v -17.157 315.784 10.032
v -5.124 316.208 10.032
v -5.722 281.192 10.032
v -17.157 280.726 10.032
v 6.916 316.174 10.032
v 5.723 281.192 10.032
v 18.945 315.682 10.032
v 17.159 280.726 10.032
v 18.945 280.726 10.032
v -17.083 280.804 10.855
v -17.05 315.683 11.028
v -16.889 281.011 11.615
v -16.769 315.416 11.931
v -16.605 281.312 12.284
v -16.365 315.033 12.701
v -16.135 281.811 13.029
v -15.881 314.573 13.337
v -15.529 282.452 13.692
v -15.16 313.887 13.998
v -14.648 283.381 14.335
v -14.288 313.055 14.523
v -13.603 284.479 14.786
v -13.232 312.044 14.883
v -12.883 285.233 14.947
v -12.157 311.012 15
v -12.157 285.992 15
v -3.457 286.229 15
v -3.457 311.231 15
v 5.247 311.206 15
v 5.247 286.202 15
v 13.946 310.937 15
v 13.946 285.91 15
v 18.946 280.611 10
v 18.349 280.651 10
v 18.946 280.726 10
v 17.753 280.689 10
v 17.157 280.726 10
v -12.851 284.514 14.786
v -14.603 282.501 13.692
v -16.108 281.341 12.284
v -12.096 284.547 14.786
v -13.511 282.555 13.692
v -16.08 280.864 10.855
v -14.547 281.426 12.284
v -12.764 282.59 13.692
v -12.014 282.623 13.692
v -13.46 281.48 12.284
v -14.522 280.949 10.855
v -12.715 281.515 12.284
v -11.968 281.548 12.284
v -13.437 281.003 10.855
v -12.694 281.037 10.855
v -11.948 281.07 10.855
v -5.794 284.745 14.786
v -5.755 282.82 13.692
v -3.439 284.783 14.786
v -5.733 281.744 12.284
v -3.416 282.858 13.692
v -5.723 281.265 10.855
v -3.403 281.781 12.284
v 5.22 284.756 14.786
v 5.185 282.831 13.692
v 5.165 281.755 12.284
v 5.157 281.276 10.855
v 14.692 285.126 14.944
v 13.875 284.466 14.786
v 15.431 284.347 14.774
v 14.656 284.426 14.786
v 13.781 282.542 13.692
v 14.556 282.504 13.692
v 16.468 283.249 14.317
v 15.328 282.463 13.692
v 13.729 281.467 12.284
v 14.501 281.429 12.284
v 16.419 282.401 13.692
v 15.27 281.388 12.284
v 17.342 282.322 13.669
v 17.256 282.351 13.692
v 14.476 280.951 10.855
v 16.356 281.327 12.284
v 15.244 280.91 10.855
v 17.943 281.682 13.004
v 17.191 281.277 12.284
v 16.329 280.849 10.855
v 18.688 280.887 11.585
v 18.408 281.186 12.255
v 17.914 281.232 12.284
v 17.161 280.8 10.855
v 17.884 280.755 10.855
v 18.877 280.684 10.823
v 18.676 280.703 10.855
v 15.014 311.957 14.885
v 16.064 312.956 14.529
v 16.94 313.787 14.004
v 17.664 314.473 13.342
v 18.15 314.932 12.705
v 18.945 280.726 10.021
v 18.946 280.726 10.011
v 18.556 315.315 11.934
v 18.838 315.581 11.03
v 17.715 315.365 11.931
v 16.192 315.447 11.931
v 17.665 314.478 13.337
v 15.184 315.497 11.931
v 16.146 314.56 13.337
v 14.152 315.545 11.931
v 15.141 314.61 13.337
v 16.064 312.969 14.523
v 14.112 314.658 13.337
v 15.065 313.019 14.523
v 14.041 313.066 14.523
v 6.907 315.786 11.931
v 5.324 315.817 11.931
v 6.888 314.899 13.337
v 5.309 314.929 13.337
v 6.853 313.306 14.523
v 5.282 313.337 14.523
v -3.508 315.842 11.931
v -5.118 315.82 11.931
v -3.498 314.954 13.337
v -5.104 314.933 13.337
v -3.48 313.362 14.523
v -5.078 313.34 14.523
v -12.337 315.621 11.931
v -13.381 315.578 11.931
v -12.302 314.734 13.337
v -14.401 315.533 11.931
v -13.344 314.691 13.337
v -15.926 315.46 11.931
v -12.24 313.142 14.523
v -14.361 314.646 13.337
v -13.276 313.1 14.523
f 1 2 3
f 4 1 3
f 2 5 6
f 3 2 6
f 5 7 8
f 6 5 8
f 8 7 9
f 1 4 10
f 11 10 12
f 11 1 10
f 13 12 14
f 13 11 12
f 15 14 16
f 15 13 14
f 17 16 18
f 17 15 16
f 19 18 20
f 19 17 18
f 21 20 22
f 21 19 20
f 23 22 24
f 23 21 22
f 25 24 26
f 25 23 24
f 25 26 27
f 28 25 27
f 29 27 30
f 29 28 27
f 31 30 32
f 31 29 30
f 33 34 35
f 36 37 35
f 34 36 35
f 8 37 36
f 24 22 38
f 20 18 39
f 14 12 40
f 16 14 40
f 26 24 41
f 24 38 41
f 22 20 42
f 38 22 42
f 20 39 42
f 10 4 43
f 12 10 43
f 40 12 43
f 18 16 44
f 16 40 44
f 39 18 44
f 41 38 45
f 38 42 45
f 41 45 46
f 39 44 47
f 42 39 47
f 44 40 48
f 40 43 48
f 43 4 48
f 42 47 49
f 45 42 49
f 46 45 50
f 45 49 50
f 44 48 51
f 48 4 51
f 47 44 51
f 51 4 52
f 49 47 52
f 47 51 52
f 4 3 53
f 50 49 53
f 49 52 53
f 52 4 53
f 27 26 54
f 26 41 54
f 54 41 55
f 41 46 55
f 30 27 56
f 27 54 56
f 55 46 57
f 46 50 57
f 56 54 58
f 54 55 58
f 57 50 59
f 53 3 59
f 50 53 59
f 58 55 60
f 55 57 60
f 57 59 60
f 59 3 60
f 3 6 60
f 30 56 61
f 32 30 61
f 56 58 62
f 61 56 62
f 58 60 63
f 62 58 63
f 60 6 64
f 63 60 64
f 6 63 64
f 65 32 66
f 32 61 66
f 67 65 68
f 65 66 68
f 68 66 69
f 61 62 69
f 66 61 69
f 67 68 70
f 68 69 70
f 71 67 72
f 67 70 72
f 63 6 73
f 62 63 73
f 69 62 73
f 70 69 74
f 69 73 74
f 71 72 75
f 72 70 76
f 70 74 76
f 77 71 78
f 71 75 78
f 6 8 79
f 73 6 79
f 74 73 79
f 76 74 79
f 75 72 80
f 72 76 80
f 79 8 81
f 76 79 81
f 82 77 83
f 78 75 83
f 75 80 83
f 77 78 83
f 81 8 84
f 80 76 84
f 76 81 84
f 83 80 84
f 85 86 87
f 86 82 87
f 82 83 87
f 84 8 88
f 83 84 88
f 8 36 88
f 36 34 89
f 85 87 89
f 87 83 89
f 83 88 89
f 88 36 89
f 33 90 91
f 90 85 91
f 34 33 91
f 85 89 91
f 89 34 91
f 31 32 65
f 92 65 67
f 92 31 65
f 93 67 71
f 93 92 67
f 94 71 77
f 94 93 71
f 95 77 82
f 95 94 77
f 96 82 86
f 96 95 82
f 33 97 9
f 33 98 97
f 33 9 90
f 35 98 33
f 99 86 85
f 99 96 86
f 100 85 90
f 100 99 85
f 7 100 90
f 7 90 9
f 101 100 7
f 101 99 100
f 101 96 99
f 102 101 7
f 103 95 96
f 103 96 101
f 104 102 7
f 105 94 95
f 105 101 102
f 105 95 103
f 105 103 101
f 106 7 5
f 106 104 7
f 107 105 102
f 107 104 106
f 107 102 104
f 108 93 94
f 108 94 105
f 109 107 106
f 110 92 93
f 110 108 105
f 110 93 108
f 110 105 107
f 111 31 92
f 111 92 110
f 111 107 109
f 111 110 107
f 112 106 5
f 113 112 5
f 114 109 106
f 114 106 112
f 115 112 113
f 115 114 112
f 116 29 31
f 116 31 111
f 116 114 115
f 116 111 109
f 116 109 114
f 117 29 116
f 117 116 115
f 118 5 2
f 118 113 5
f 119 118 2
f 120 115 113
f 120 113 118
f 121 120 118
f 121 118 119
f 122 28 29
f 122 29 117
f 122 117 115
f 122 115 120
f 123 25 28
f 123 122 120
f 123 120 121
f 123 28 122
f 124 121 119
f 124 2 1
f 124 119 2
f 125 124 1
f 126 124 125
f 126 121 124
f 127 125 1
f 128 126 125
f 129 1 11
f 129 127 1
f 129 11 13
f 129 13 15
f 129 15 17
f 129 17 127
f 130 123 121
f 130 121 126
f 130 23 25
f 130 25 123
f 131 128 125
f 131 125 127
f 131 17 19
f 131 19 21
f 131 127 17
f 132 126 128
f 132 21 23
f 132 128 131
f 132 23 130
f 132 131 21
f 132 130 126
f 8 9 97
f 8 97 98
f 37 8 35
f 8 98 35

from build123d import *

# Parameters (mm, degrees)
F0_R        = 316.25
F0_R_2      = 281.25
F1_DEPTH    = 10
F3_DEPTH    = 5
F4_W        = 212.0740879327
F4_H        = 34.9558026777
F4_W_2      = 196.2447150651
F4_H_2      = 35.0580604298
F5_DEPTH    = 84
F6_W        = 1.3297378083
F6_H        = 10.0317904726
F7_DEPTH    = 42
F8_T1_DEPTH = 60.0580604298
F8_T3_DEPTH = 60.0708356762
F8_T6_ANGLE = 12.4528096898
F8_T8_ANGLE = 11.0736814867


# Not quite as in the source:
# - a fillet or chamfer that OpenCascade refuses, or shapes differently, is made with other operations: its cross-section is extruded or revolved along the edge and cut away or added


with BuildPart() as f1:
    # F0 (on Top) → F1 (new body)
    with BuildSketch(Plane.XY):
        Circle(F0_R)
        Circle(F0_R_2, mode=Mode.SUBTRACT)
    extrude(amount=F1_DEPTH)

    # F2 (on face) → F3 (join)
    with BuildSketch(Plane.XY.offset(10)):
        with BuildLine():
            ThreePointArc((18.9455430955, 315.6820059757), (0.8957518585, 316.2487314261), (-17.1569601592, 315.7842637278))
            Line((-17.1569601592, 315.7842637278), (-17.1569601592, 280.726203298))
            ThreePointArc((-17.1569601592, 280.726203298), (0.8961391508, 281.2485723246), (18.9455430955, 280.6111702994))
            Line((18.9455430955, 280.6111702994), (18.9455430955, 315.6820059757))
        make_face()
    extrude(amount=F3_DEPTH)

    # F4 (on face) → F5 (cut)
    with BuildSketch(Plane.XY.offset(10)):
        Polygon((417.2187745571, -329.5601010323), (417.2187745571, 280.726203298), (231.0196310282, 280.726203298), (18.9455430955, 280.726203298), (-17.1569601592, 280.726203298), (-213.4016752243, 280.726203298), (-349.9614596367, 280.726203298), (-349.9614596367, -329.5601010323), align=None)
        with Locations((124.9825870618, 298.2041046368)):
            Rectangle(F4_W, F4_H)
        with Locations((-115.2793176918, 298.2552335129)):
            Rectangle(F4_W_2, F4_H_2)
    extrude(amount=-F5_DEPTH, mode=Mode.SUBTRACT)

    # F6 (on face) → F7 (cut)
    with BuildSketch(Plane.YZ.offset(18.9455430955)):
        Polygon((280.726203298, 10), (280.726203298, 0), (315.6820059757, 0), (315.6820059757, 10.0317904726), (280.726203298, 10.0317904726), align=None)
        with Locations((316.3468748798, 5.0158952363)):
            Rectangle(F6_W, F6_H)
    extrude(amount=-F7_DEPTH, mode=Mode.SUBTRACT)

    # F8: fillet of radius 5 on 4 edges, made by hand

    # F8_s2 → F8_t1 (cut)
    with BuildSketch(Plane.XZ.offset(-328.2842637278)):
        with BuildLine():
            ThreePointArc((-17.1569601592, 10), (-15.6924940651, 13.5355339059), (-12.1569601592, 15))
            Line((-12.1569601592, 15), (-17.1569601592, 15))
            Line((-17.1569601592, 15), (-17.1569601592, 10))
        make_face()
    extrude(amount=F8_T1_DEPTH, mode=Mode.SUBTRACT)

    # F8_s4 → F8_t3 (cut)
    with BuildSketch(Plane.XZ.offset(-328.1820059757)):
        with BuildLine():
            ThreePointArc((13.9455430955, 15), (17.4810770014, 13.5355339059), (18.9455430955, 10))
            Line((18.9455430955, 10), (18.9455430955, 15))
            Line((18.9455430955, 15), (13.9455430955, 15))
        make_face()
    extrude(amount=F8_T3_DEPTH, mode=Mode.SUBTRACT)

    # F8_s5 → F8_t6 (revolve, cut)
    with BuildSketch(Plane(origin=(0, 0, 0), x_dir=(0, 0, 1), z_dir=(-0.9944416157, -0.1052894726, 0))):
        with BuildLine():
            ThreePointArc((15, 286.25), (13.5355339059, 282.7144660941), (10, 281.25))
            Line((10, 281.25), (15, 281.25))
            Line((15, 281.25), (15, 286.25))
        make_face()
    revolve(axis=Axis((0, 0, 15), (0, 0, -1)), revolution_arc=F8_T6_ANGLE, mode=Mode.SUBTRACT)

    # F8_s7 → F8_t8 (revolve, cut)
    with BuildSketch(Plane(origin=(0, 0, 0), x_dir=(0, 0, 1), z_dir=(0.995057084, -0.0993045796, 0))):
        with BuildLine():
            ThreePointArc((10, -316.25), (13.5355339059, -314.7855339059), (15, -311.25))
            Line((15, -311.25), (15, -316.25))
            Line((15, -316.25), (10, -316.25))
        make_face()
    revolve(axis=Axis((0, 0, 15), (0, 0, 1)), revolution_arc=F8_T8_ANGLE, mode=Mode.SUBTRACT)


solid = f1.part
